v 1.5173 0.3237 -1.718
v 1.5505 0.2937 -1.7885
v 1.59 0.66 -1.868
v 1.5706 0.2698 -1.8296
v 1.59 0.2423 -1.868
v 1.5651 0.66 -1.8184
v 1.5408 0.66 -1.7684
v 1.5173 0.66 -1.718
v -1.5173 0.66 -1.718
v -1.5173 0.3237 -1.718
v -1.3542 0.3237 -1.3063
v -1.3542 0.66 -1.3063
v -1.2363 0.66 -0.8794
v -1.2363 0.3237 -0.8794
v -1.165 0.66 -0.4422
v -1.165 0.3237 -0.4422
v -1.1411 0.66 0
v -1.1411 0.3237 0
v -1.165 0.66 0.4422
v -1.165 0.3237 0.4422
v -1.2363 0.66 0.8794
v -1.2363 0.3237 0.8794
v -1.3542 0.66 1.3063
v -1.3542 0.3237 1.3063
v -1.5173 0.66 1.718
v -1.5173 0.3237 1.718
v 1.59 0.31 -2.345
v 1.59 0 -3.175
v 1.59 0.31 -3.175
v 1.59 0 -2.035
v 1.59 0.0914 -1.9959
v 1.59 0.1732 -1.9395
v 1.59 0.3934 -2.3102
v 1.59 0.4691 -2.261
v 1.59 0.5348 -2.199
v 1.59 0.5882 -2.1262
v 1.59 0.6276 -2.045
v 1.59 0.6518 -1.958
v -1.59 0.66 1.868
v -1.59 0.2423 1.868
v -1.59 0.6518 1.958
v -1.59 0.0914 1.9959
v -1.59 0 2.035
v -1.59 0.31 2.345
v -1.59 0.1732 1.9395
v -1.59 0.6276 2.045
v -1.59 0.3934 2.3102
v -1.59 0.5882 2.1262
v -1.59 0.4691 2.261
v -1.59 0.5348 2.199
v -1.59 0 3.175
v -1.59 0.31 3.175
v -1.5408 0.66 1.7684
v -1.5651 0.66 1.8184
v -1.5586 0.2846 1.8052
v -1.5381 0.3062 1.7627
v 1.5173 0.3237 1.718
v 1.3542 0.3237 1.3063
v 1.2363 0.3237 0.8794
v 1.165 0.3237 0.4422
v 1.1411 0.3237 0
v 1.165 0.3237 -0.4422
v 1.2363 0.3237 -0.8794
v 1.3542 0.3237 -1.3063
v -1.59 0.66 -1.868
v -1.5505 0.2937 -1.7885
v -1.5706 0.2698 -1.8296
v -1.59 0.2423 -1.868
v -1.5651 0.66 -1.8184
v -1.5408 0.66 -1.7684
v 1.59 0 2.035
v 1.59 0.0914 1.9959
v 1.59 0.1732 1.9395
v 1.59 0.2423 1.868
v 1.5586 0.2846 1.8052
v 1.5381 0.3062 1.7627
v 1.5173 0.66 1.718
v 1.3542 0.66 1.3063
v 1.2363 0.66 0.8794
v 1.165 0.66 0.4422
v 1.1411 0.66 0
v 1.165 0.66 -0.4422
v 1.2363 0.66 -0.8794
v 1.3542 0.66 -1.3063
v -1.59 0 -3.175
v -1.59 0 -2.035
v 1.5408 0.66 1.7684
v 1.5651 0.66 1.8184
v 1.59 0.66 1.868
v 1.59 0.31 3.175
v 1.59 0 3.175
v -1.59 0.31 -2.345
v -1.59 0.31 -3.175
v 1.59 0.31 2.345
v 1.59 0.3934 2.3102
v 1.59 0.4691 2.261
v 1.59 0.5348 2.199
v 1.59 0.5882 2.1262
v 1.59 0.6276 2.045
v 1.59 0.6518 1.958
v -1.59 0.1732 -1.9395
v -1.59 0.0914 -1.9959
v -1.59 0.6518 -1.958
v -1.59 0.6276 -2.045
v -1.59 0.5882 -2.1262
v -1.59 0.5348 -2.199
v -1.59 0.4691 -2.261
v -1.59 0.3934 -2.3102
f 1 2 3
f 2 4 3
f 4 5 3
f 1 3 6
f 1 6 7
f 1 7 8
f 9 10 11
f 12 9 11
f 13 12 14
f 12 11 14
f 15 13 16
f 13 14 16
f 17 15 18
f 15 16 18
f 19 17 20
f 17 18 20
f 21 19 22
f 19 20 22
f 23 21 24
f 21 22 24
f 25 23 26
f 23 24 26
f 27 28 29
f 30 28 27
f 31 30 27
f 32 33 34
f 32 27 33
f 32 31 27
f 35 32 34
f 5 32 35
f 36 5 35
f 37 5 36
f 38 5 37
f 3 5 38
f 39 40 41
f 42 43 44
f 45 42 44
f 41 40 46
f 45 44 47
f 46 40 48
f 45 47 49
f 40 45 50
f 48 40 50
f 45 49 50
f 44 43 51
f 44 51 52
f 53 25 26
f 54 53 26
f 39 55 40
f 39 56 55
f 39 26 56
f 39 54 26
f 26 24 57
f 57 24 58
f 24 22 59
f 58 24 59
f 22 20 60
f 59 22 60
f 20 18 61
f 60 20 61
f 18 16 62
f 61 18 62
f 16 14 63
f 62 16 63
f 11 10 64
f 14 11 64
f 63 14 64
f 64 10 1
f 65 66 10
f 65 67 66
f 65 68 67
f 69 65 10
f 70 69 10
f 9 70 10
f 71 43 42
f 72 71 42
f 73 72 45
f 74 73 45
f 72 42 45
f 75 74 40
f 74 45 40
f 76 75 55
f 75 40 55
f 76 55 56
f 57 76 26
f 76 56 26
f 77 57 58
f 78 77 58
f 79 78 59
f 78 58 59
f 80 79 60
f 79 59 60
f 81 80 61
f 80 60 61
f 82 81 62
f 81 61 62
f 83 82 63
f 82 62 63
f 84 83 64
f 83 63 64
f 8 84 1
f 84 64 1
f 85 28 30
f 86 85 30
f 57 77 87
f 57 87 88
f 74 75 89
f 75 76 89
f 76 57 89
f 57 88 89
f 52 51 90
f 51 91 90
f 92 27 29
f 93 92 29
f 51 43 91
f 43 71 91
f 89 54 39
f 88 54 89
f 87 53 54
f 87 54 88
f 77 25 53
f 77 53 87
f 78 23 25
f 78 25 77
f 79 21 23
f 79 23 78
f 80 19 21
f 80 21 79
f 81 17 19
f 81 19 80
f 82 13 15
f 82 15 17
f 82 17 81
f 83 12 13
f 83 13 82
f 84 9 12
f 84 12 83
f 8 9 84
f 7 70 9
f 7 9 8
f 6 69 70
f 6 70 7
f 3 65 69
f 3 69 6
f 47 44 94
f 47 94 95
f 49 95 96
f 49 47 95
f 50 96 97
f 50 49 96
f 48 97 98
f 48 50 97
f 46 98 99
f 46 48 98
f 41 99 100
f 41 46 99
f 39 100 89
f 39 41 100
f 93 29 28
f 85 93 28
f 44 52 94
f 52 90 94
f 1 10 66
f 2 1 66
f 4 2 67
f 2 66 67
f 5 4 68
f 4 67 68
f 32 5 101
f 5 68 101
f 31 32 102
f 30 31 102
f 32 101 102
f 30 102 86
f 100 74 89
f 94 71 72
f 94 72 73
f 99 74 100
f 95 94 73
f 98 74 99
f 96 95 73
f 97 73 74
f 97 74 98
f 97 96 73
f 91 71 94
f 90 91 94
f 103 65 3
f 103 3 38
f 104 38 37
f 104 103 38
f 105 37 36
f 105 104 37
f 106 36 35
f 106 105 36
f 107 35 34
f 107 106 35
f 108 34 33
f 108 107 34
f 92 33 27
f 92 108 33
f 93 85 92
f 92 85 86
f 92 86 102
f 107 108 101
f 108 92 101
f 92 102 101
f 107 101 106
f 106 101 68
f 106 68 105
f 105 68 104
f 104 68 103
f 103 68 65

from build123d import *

# Parameters (mm, degrees)
BOSS_EXTRUDE1_DEPTH     = 1.59
FILLET1_START           = -1.59
FILLET1_DEPTH           = 3.18
FILLET1_2_DEPTH         = 3.18
CUT_EXTRUDE1_DEPTH      = 4.611692816
CUT_EXTRUDE2_DEPTH      = 4.611692879
CUT_EXTRUDE2_DEPTH_BACK = 4.611692879
BOSS_EXTRUDE2_START     = -0.336291
BOSS_EXTRUDE2_DEPTH     = 0.336291


with BuildPart() as part:
    # Sketch1 → Boss-Extrude1 (new, symmetric)
    with BuildSketch(Plane(origin=(0, 0, 0), x_dir=(0, 0, -1), z_dir=(1, 0, 0))):
        Polygon((3.175, 0), (2.035, 0), (2.035, 0.35), (-2.035, 0.35), (-2.035, 0), (-3.175, 0), (-3.175, 0.31), (-2.345, 0.31), (-2.345, 0.66), (2.345, 0.66), (2.345, 0.31), (3.175, 0.31), align=None)
    extrude(amount=BOSS_EXTRUDE1_DEPTH, both=True)

    # Fillet1: read off the stored shape, not the designer's step
    # Fillet1 outline → Fillet1 (cut)
    with BuildSketch(Plane.YZ.offset(FILLET1_START)):
        with BuildLine():
            ThreePointArc((0.31, 2.345), (0.563112887, 2.163834388), (0.66, 1.868030399))
            Line((0.66, 1.868030399), (0.66, 2.345))
            Line((0.66, 2.345), (0.31, 2.345))
        make_face()
        with BuildLine():
            ThreePointArc((0.66, -1.868030399), (0.563112887, -2.163834388), (0.31, -2.345))
            Line((0.31, -2.345), (0.66, -2.345))
            Line((0.66, -2.345), (0.66, -1.868030399))
        make_face()
    extrude(amount=FILLET1_DEPTH, mode=Mode.SUBTRACT)

    # Fillet1 2 outline → Fillet1 2 (add)
    with BuildSketch(Plane.YZ.offset(FILLET1_START)):
        with BuildLine():
            Line((0.35, 2.035), (0, 2.035))
            ThreePointArc((0, 2.035), (0.253112887, 1.853834388), (0.35, 1.558030399))
            Line((0.35, 1.558030399), (0.35, 2.035))
        make_face()
        with BuildLine():
            Line((0.35, -2.035), (0.35, -1.558030399))
            ThreePointArc((0.35, -1.558030399), (0.253112887, -1.853834388), (0, -2.035))
            Line((0, -2.035), (0.35, -2.035))
        make_face()
    extrude(amount=FILLET1_2_DEPTH)

    # Sketch3 → Cut-Extrude1 (cut, symmetric)
    with BuildSketch(Plane(origin=(0, 0.66, 0), x_dir=(1, 0, 0), z_dir=(0, 1, 0))):
        with BuildLine():
            Line((-1.59, -1.868030399), (-1.59, 1.868030399))
            ThreePointArc((-1.59, 1.868030399), (-1.14113305, 0), (-1.59, -1.868030399))
        make_face()
    cut_extrude1 = extrude(amount=CUT_EXTRUDE1_DEPTH, both=True, mode=Mode.SUBTRACT)

    # Mirror1: Cut-Extrude1 across plane
    add(cut_extrude1.mirror(Plane(origin=(0, 0, 0), x_dir=(0, 0, 1), z_dir=(1, 0, 0))), mode=Mode.SUBTRACT)

    # Sketch4 → Cut-Extrude2 (cut, two sides: drawn at the far end of the back side and taken through both)
    with BuildSketch(Plane(origin=(0, 0.66, 0), x_dir=(1, 0, 0), z_dir=(0, 1, 0)).offset(-CUT_EXTRUDE2_DEPTH_BACK)):
        with BuildLine():
            Line((-1.517289395, -1.718030399), (1.517289395, -1.718030399))
            ThreePointArc((1.517289395, -1.718030399), (1.14113305, 0), (1.517289395, 1.718030399))
            Line((1.517289395, 1.718030399), (-1.517289395, 1.718030399))
            ThreePointArc((-1.517289395, 1.718030399), (-1.14113305, 0), (-1.517289395, -1.718030399))
        make_face()
    extrude(amount=CUT_EXTRUDE2_DEPTH + CUT_EXTRUDE2_DEPTH_BACK, mode=Mode.SUBTRACT)


with BuildPart() as cut_extrude2_piece_1:
    # of the separate pieces the step leaves, piece 1, a body of its own (cut_extrude2_pieces)
    add(part.part.solids().sort_by_distance((-1.59, 0, -3.175))[0])



with BuildPart() as cut_extrude2_piece_2:
    # of the separate pieces the step leaves, piece 2, a body of its own (cut_extrude2_pieces)
    add(part.part.solids().sort_by_distance((-1.59, 0.66, 1.868030399))[0])


with BuildPart() as cut_extrude2_piece_1_1:
    add(cut_extrude2_piece_1.part)

    add(cut_extrude2_piece_2.part)  # Boss-Extrude2 merges Cut-Extrude2 piece 2
    # Sketch4<2> → Boss-Extrude2 (add)
    with BuildSketch(Plane(origin=(0, 0.66, 0), x_dir=(1, 0, 0), z_dir=(0, 1, 0)).offset(BOSS_EXTRUDE2_START)):
        with BuildLine():
            Line((-1.517289395, -1.718030399), (1.517289395, -1.718030399))
            ThreePointArc((1.517289395, -1.718030399), (1.14113305, 0), (1.517289395, 1.718030399))
            Line((1.517289395, 1.718030399), (-1.517289395, 1.718030399))
            ThreePointArc((-1.517289395, 1.718030399), (-1.14113305, 0), (-1.517289395, -1.718030399))
        make_face()
    extrude(amount=BOSS_EXTRUDE2_DEPTH)


solid = cut_extrude2_piece_1_1.part
